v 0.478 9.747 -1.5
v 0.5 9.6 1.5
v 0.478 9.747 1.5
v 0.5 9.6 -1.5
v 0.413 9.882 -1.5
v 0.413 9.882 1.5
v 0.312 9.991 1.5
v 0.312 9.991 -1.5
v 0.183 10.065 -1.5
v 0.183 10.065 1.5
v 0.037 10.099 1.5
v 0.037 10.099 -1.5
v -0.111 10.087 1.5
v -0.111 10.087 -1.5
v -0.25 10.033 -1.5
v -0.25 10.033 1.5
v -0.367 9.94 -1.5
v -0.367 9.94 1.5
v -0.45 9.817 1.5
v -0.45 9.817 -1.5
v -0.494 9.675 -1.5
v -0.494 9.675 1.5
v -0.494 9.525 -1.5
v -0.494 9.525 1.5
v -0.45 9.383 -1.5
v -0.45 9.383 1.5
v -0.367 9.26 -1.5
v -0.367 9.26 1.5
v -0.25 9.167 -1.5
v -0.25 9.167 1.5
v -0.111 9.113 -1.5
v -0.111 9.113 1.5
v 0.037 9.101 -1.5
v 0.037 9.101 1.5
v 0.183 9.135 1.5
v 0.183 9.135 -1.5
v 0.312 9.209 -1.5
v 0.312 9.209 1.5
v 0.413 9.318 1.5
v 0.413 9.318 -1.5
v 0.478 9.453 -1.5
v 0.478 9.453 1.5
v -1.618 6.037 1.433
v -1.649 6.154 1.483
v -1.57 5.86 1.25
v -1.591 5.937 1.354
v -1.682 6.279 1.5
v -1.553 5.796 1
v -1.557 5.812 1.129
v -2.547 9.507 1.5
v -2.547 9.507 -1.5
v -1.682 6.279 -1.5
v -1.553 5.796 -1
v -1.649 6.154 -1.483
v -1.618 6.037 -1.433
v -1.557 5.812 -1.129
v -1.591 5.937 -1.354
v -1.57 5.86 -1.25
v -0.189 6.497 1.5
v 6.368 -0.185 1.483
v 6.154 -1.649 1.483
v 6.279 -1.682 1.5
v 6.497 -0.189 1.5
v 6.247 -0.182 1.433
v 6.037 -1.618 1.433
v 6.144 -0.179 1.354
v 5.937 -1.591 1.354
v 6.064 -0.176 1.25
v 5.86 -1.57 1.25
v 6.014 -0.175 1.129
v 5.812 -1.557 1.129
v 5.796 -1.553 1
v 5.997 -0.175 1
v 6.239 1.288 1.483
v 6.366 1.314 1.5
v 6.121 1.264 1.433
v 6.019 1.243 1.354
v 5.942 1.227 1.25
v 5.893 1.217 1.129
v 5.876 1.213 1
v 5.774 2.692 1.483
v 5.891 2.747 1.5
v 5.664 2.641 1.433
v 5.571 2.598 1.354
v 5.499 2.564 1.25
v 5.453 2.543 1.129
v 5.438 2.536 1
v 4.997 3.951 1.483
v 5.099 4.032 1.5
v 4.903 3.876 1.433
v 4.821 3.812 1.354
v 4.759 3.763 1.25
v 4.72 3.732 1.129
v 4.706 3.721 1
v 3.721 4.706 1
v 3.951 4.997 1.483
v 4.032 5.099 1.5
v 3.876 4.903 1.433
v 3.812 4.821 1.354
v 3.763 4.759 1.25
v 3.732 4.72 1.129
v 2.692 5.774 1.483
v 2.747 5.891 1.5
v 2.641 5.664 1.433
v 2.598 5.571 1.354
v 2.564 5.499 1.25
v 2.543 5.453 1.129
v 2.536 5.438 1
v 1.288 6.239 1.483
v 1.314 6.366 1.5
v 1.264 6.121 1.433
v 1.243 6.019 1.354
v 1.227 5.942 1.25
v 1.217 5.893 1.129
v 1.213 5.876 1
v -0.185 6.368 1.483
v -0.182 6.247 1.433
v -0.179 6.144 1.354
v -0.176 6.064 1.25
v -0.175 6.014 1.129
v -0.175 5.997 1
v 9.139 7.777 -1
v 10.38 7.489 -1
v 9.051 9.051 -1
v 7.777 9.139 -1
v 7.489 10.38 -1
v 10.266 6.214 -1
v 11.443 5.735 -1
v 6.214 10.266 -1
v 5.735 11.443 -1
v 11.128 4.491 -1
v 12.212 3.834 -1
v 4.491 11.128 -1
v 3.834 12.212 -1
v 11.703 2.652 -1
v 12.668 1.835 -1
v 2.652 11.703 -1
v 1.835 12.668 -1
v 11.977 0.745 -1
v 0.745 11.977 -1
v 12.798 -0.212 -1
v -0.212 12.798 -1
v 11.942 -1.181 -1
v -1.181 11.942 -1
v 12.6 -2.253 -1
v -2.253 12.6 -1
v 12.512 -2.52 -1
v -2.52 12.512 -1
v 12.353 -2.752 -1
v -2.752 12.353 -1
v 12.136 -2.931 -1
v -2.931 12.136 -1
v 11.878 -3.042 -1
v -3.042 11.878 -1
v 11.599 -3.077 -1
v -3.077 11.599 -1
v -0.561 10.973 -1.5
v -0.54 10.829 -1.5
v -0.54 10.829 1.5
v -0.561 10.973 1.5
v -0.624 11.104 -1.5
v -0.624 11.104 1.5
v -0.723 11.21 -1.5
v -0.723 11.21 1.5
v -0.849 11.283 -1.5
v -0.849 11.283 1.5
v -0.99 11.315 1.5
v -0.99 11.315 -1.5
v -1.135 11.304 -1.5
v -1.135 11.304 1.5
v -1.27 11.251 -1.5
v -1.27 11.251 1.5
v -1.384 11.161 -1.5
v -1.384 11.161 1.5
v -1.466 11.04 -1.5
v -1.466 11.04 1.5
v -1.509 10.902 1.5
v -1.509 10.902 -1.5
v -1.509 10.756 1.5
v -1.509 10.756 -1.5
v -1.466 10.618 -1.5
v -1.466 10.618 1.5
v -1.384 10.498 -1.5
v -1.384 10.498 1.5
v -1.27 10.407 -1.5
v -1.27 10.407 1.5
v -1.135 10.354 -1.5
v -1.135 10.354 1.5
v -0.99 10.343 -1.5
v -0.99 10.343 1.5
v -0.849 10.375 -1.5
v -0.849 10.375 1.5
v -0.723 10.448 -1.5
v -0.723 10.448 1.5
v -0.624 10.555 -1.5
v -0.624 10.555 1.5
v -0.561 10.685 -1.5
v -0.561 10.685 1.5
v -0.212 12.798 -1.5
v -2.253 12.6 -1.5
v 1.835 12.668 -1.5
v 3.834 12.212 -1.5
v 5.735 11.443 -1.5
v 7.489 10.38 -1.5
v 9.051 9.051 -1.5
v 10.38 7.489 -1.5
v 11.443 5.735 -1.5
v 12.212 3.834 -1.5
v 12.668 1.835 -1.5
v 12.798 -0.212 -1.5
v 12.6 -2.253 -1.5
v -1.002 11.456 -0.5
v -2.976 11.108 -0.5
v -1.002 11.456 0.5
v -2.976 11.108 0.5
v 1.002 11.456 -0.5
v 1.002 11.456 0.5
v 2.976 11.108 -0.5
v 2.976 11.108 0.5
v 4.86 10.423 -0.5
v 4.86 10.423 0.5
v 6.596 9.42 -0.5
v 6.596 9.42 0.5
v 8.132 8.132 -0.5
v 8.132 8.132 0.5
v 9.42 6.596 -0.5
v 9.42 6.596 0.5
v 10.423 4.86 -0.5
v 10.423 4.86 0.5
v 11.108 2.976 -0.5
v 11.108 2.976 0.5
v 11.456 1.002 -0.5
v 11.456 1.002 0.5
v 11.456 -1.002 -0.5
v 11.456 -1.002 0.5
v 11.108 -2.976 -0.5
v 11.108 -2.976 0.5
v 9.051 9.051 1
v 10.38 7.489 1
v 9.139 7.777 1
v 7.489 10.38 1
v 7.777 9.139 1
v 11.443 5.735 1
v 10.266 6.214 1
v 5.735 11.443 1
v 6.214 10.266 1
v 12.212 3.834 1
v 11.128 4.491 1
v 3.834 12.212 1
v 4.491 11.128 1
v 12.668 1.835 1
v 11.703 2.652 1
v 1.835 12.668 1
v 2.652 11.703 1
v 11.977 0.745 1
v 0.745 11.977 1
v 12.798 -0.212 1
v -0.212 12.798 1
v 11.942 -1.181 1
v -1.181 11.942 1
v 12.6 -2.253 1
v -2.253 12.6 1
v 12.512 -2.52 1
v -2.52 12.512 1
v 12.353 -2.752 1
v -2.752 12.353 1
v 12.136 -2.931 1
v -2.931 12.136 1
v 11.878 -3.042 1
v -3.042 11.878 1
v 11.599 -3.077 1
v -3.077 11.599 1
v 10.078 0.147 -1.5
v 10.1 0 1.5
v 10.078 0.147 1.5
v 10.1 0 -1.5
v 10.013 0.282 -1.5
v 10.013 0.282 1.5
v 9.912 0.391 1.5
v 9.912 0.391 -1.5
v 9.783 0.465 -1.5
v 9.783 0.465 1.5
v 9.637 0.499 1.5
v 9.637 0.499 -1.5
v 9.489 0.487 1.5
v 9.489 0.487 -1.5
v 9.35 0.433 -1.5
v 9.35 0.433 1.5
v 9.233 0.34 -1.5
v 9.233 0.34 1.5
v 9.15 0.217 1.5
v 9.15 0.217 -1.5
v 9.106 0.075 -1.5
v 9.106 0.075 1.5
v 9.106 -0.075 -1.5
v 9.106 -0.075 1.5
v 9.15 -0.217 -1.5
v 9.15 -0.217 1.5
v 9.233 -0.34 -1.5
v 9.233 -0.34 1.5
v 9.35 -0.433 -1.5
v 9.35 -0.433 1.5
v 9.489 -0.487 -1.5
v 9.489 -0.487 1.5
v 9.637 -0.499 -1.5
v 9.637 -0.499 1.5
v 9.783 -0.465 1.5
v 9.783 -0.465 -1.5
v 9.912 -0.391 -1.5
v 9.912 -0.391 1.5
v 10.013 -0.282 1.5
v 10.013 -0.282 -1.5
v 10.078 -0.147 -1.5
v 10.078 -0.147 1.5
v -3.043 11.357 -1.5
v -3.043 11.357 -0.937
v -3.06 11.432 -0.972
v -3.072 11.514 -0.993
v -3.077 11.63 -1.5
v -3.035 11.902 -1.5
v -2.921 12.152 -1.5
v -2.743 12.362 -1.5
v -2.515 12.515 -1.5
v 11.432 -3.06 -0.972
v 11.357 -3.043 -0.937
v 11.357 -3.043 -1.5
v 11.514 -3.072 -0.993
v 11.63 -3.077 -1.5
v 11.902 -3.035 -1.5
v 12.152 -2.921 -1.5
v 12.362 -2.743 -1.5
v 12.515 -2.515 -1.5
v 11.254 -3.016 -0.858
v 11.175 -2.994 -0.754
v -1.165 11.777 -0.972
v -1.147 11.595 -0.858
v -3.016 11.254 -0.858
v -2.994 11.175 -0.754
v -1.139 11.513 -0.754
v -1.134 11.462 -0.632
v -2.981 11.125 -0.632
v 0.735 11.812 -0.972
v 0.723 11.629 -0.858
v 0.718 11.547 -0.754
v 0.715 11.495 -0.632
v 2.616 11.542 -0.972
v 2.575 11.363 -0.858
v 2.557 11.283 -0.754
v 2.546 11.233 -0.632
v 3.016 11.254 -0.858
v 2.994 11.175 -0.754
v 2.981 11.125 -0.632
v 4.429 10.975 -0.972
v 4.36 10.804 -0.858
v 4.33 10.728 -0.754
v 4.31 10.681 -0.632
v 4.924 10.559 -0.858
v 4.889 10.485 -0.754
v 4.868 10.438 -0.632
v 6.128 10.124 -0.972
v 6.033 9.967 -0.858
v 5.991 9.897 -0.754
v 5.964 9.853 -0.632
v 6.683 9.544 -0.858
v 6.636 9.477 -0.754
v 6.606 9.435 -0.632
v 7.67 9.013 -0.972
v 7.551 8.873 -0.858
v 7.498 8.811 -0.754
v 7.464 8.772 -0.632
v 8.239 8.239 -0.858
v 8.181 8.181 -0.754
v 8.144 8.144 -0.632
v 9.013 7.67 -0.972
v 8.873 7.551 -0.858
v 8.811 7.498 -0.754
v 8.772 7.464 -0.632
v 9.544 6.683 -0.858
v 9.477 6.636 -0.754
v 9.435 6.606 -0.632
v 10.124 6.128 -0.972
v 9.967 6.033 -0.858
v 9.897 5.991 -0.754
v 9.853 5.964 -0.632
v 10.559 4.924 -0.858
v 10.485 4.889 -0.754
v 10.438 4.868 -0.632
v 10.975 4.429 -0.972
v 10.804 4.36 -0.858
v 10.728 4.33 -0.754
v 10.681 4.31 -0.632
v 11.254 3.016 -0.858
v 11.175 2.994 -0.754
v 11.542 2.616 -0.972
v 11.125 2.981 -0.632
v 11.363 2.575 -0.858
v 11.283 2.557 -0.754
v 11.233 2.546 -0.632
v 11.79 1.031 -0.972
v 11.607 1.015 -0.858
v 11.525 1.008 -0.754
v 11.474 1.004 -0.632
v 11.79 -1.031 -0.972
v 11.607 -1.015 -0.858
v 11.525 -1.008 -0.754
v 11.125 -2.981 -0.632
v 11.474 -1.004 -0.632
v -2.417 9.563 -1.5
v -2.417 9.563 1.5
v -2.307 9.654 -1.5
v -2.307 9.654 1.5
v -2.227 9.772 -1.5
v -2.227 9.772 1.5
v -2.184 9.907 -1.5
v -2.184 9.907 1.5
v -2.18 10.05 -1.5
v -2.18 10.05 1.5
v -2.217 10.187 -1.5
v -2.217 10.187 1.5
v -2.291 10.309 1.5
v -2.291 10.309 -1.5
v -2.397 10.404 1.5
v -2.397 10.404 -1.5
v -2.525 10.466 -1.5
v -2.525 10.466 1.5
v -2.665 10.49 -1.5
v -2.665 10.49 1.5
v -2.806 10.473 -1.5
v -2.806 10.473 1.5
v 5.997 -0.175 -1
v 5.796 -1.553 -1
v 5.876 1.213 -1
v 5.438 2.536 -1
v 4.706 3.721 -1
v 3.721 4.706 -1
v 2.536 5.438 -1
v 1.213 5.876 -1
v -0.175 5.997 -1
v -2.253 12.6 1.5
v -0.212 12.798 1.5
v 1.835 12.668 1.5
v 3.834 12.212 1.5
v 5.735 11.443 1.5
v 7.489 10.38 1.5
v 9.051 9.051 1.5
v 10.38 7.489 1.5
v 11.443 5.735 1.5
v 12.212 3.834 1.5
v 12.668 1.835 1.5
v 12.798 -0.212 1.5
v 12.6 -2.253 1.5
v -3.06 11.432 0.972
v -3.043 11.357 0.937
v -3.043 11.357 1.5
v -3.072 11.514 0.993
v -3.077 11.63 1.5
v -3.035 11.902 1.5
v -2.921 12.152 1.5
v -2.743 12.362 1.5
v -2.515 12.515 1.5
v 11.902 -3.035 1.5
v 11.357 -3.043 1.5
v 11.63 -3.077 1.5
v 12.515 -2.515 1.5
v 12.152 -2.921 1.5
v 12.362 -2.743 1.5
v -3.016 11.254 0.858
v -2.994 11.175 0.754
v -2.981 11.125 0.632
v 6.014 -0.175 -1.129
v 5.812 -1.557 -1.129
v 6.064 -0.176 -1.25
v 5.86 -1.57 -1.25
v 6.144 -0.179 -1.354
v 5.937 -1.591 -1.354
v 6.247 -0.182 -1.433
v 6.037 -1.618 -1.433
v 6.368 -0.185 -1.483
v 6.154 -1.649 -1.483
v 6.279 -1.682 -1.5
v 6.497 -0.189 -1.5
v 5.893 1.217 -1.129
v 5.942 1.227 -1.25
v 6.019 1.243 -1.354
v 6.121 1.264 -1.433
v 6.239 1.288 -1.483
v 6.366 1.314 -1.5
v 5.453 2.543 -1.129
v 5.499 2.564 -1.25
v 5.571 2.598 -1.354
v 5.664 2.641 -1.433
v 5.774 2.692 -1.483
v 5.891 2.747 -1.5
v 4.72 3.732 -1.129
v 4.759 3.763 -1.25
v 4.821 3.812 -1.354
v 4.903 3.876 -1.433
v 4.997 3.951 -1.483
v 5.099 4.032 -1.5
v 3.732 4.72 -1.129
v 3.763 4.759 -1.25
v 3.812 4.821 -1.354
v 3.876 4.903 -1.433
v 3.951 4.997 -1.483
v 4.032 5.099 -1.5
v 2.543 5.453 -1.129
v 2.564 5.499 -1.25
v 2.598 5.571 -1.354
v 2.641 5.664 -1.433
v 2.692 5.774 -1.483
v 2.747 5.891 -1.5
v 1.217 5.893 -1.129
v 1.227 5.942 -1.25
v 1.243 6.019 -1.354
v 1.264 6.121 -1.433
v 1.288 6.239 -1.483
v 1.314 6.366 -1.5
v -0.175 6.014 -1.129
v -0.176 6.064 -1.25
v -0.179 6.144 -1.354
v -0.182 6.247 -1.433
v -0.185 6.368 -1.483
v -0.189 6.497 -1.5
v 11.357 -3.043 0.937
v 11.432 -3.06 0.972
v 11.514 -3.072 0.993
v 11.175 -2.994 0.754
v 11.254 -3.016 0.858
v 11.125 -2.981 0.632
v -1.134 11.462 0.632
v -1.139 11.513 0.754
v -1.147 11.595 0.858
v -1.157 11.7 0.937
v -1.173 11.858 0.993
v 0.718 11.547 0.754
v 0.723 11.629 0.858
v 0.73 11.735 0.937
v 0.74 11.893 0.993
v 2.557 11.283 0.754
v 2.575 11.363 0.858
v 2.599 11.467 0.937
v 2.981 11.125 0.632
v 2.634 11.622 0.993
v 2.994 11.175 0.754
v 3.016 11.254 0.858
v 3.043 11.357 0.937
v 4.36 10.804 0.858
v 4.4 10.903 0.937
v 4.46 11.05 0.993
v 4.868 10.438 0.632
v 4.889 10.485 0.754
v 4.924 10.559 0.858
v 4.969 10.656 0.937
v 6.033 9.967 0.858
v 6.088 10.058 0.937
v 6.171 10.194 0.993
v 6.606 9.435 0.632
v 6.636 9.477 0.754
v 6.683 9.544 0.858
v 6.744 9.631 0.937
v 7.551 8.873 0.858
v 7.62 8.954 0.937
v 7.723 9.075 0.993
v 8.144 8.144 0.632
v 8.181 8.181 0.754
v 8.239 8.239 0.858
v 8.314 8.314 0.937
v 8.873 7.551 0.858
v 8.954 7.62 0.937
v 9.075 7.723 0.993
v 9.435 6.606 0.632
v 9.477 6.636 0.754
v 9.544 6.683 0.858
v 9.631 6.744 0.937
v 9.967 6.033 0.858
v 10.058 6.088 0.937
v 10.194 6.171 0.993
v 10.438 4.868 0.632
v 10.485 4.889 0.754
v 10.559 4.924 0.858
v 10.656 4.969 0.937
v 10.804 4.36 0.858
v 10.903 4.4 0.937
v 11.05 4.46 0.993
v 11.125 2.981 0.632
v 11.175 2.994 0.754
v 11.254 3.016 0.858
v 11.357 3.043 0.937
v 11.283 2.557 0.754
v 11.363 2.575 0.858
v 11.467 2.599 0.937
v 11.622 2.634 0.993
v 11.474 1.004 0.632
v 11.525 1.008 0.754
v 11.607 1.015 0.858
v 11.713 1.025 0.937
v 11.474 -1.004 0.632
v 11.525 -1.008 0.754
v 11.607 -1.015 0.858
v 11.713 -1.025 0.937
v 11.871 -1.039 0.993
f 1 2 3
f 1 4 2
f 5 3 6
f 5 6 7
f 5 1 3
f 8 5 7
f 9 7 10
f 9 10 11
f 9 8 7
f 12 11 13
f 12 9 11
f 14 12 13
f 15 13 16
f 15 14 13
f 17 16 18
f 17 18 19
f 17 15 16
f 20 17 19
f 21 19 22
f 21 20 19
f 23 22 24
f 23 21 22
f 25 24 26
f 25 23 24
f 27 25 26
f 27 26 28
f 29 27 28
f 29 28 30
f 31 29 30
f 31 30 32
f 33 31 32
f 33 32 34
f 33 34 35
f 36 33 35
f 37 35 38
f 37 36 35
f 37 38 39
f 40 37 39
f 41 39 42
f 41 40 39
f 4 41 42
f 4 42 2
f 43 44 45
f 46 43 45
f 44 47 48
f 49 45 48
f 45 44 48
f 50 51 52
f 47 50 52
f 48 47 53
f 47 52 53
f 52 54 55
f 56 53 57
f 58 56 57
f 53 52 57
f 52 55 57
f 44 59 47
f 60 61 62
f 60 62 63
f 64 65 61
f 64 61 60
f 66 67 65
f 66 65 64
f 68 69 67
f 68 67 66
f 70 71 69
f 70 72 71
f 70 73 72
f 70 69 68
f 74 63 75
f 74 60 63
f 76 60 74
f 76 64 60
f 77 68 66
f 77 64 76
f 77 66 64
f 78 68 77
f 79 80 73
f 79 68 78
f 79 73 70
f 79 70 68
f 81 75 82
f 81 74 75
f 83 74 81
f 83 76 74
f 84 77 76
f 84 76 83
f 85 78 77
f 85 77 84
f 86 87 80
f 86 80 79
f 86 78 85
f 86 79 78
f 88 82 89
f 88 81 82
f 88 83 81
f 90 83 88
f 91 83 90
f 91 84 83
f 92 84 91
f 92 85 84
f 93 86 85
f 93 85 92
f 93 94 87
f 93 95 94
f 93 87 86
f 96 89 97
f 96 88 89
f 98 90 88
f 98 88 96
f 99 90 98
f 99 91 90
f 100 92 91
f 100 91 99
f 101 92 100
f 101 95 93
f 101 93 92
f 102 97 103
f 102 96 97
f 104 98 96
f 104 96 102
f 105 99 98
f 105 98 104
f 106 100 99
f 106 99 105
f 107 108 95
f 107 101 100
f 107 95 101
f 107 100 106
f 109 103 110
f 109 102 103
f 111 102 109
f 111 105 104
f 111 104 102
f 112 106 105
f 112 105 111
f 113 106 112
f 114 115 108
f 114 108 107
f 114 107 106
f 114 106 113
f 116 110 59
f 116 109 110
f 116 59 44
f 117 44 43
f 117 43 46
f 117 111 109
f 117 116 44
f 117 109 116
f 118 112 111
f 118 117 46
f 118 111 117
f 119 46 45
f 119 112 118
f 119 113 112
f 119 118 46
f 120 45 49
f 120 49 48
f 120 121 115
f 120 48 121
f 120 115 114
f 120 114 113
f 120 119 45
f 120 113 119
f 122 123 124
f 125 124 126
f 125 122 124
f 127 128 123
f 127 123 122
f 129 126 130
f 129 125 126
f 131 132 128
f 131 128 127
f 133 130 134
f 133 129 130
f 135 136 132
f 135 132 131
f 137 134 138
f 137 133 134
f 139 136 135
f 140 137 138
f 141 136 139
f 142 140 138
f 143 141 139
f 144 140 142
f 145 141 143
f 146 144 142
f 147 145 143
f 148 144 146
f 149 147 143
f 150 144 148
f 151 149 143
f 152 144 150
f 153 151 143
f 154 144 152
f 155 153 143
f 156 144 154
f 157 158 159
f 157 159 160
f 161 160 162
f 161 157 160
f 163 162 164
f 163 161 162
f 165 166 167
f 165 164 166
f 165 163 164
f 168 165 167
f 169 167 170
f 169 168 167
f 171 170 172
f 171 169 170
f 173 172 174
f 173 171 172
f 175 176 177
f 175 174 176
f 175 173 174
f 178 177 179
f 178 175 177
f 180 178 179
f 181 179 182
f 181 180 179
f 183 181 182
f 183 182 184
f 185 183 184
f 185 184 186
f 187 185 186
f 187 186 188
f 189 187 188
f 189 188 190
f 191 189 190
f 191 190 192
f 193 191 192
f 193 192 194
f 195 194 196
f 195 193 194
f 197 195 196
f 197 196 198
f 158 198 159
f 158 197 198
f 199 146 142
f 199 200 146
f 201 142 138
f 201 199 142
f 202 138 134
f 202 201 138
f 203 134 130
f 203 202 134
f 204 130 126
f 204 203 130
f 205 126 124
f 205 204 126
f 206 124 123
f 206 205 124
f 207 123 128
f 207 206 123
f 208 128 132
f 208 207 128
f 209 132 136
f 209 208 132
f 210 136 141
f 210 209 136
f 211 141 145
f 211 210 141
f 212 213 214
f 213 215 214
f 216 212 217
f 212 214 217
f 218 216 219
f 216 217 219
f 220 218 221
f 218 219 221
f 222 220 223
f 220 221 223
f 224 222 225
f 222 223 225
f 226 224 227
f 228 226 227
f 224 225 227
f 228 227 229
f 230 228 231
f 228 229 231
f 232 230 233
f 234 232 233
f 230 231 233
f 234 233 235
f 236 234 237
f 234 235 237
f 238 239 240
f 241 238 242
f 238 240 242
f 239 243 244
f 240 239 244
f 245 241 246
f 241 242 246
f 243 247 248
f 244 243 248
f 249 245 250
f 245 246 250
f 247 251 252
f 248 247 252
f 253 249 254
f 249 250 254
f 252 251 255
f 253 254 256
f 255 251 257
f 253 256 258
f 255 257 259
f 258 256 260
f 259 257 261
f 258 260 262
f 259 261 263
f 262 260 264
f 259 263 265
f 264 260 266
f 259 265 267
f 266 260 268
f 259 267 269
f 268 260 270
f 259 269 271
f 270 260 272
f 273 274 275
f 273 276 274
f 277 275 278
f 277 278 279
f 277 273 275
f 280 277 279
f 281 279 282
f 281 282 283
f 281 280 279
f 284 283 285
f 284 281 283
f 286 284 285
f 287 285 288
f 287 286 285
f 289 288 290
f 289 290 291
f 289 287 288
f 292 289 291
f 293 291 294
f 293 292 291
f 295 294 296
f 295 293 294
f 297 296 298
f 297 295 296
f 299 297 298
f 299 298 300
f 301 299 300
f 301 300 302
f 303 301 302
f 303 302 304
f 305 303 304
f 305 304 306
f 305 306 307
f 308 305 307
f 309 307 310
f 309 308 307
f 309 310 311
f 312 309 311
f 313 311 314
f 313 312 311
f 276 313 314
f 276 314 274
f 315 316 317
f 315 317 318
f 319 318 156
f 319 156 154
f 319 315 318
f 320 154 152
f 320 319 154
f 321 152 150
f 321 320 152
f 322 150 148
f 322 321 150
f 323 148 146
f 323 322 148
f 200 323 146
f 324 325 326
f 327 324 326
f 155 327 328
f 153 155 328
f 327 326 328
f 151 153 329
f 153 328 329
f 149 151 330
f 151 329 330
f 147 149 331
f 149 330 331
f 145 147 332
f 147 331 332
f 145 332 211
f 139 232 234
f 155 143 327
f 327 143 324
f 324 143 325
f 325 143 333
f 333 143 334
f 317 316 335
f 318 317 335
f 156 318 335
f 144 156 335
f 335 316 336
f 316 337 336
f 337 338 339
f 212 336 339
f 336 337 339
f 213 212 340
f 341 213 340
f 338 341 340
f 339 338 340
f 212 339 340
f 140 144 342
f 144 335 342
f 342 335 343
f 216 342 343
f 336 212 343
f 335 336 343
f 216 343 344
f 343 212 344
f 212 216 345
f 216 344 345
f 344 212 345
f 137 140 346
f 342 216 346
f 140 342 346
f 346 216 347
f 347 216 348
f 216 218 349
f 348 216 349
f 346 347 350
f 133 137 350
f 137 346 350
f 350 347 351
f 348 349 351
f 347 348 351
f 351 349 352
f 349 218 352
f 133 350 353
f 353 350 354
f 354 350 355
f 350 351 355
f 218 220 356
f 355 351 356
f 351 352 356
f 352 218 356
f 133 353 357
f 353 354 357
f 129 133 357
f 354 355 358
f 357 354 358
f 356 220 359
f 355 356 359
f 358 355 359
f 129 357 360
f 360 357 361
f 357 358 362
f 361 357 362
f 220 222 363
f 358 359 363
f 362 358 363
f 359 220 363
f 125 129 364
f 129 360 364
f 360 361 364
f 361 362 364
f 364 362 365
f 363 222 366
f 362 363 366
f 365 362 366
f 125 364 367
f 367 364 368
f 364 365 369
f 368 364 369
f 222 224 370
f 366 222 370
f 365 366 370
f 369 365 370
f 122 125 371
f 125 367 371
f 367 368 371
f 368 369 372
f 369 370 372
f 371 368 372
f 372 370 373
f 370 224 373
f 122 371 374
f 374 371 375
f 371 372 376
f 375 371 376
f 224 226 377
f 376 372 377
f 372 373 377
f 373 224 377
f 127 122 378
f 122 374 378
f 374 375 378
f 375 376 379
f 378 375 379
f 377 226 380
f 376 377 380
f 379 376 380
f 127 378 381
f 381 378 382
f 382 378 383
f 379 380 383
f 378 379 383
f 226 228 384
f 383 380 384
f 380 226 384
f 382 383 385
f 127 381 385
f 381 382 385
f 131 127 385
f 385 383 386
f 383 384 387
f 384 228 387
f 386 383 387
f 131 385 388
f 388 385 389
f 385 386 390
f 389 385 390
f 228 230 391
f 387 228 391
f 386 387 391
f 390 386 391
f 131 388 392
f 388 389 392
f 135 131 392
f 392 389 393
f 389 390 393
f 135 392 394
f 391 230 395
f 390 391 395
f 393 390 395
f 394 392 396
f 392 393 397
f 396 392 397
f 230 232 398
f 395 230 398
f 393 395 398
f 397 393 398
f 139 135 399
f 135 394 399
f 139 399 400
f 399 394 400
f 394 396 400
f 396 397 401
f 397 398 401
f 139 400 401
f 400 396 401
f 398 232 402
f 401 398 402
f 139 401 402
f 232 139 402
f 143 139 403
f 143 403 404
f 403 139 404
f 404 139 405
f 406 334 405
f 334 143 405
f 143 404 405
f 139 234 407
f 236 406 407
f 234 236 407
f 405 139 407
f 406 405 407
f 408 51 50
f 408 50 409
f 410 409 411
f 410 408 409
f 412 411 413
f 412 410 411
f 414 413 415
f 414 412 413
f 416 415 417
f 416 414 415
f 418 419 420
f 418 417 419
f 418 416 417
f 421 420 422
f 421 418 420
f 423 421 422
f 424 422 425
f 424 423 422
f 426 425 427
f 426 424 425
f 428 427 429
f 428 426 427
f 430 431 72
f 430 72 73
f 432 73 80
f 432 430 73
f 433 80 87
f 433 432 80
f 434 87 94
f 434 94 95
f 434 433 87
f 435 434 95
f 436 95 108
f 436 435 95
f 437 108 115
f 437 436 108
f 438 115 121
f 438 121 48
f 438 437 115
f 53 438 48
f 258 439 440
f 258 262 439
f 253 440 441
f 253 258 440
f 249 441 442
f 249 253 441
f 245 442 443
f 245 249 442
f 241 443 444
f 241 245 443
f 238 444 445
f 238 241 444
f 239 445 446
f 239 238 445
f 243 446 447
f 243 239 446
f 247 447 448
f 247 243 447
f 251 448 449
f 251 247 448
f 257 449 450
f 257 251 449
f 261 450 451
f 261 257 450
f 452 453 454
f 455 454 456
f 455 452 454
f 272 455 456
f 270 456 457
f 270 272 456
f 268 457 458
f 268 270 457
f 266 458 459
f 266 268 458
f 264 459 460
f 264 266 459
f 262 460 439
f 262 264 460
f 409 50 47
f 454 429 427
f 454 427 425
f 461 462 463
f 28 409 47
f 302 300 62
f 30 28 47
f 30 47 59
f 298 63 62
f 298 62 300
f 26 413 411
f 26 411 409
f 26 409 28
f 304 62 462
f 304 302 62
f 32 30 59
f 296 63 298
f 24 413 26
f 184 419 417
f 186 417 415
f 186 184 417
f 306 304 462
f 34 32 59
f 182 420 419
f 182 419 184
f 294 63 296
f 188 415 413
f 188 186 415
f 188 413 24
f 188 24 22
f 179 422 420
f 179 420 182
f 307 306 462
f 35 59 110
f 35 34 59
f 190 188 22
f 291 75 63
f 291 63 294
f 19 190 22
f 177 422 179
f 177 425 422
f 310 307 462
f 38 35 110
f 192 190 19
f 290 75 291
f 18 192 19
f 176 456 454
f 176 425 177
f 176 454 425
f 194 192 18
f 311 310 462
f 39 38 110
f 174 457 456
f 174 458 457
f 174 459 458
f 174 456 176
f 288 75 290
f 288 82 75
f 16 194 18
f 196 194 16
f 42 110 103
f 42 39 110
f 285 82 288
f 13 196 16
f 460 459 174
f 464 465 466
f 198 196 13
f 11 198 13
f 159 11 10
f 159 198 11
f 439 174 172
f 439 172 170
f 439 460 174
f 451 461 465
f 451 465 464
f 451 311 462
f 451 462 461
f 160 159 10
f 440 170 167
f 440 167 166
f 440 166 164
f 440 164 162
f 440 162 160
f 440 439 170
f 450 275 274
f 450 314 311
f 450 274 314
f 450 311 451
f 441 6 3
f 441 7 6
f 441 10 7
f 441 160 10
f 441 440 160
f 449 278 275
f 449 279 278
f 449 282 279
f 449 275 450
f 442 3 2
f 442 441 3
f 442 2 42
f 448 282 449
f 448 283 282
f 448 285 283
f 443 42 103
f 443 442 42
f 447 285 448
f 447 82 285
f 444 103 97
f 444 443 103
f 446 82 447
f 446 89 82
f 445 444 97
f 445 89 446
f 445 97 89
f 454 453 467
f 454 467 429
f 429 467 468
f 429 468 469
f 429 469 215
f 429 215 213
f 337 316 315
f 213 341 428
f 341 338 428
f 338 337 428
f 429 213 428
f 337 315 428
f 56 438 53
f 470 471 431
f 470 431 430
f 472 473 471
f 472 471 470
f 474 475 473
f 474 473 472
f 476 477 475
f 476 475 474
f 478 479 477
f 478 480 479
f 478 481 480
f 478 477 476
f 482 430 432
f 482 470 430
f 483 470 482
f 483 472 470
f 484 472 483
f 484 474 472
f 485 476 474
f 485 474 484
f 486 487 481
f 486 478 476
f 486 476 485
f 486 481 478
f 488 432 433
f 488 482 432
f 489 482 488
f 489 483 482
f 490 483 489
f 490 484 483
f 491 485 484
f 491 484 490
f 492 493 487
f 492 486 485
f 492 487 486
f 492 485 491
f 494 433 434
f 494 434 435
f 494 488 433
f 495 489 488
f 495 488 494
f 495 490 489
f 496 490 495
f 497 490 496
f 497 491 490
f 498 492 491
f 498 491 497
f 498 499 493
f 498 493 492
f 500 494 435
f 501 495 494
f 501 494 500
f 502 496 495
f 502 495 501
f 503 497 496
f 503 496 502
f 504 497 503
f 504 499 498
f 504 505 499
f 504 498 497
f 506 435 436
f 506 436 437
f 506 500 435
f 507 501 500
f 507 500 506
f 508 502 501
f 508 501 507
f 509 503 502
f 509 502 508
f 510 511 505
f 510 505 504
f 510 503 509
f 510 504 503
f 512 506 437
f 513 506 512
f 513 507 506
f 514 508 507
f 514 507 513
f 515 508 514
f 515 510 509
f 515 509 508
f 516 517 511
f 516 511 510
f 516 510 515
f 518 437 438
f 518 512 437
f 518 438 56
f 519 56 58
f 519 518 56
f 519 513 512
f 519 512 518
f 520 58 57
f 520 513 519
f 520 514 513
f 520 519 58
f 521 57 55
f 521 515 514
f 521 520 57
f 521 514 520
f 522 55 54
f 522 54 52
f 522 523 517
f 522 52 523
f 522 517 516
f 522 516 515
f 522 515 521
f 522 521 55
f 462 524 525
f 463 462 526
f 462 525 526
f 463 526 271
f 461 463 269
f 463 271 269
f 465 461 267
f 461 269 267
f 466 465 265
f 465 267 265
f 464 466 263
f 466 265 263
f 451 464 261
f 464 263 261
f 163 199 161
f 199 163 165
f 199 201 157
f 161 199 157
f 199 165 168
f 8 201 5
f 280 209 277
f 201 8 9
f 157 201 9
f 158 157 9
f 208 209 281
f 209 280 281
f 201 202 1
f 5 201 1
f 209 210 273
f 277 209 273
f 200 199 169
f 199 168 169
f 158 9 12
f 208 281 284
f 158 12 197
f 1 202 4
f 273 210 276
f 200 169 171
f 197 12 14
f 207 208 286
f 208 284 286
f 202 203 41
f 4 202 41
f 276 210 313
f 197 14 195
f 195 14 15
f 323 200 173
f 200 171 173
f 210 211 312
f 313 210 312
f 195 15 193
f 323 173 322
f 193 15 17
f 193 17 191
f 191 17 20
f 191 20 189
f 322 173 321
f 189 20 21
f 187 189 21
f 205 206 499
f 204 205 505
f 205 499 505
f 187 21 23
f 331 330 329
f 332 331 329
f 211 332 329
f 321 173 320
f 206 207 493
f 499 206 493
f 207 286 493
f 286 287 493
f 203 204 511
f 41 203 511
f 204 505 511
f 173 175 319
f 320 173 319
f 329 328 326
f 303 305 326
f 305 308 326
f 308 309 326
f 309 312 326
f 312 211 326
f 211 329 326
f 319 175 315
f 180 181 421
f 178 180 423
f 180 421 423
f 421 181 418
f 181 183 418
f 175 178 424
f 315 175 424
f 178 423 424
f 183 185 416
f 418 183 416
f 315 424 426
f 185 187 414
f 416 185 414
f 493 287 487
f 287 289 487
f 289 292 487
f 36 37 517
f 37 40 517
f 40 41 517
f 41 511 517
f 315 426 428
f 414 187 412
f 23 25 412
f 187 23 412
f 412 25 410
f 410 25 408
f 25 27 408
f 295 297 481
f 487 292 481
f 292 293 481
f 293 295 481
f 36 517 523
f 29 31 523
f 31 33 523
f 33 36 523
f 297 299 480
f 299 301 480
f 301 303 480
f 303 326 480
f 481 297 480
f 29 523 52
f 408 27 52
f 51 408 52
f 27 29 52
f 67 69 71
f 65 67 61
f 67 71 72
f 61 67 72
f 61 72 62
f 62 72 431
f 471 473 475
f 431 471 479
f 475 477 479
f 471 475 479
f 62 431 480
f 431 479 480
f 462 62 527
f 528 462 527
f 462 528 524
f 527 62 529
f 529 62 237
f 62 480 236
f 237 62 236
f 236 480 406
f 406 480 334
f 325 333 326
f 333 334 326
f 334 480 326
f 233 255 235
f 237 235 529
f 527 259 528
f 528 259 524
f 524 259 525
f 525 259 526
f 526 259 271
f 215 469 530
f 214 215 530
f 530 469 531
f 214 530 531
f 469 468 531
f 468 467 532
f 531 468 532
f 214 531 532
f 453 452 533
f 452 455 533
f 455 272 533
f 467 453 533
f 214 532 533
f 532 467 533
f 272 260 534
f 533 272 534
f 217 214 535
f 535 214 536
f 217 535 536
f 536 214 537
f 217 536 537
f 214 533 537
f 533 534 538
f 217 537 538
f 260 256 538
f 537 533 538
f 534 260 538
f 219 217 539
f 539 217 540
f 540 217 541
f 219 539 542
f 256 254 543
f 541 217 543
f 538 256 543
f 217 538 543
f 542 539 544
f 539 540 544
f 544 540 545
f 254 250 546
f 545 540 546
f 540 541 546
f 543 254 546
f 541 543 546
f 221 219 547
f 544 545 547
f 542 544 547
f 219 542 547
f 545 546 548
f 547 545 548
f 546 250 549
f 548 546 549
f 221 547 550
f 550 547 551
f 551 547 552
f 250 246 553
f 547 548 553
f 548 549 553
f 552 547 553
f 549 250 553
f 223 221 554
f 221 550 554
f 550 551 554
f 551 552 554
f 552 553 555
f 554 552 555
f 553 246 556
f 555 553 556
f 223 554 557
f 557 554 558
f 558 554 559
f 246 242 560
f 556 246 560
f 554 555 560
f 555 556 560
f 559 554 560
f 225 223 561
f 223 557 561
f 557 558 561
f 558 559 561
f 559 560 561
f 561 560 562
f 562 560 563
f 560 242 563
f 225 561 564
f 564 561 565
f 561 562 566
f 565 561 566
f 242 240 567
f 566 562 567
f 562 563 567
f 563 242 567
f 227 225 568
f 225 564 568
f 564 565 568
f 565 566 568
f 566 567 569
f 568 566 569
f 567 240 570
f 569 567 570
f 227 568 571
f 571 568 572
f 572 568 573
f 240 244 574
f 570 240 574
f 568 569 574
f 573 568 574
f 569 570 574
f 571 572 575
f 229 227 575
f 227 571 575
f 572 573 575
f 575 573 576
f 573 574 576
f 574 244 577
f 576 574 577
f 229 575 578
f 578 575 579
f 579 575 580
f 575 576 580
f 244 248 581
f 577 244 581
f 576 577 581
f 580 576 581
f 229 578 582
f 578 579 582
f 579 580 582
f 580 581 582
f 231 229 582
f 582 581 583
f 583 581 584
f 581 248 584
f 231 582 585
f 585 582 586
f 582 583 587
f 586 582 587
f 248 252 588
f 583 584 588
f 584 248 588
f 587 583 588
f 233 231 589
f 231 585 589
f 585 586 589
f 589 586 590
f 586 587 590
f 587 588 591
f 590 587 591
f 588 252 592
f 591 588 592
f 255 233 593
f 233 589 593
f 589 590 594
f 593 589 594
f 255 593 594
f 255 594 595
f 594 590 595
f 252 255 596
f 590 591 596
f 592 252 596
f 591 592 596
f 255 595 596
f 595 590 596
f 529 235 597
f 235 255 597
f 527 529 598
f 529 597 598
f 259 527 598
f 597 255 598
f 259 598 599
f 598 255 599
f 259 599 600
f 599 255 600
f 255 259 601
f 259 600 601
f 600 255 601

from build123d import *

# Parameters (mm, degrees)
SKETCH1_R               = 12
SKETCH1_R_2             = 0.5
SKETCH1_R_3             = 6
BOSS_EXTRUDE1_DEPTH     = 1.5
SKETCH6_W               = 0.8
SKETCH6_H               = 0.5
CUT_EXTRUDE1_DEPTH      = 19.163975336
CUT_EXTRUDE1_DEPTH_BACK = 19.163975336
CUT_EXTRUDE2_DEPTH      = 19.348841925
CUT_EXTRUDE2_DEPTH_BACK = 19.348841925
SKETCH5_R               = 0.5
SKETCH5_R_2             = 0.48729794
FILLET1_R               = 0.5
FILLET2_R               = 1


with BuildPart() as part:
    # Sketch1 → Boss-Extrude1 (new, symmetric)
    with BuildSketch(Plane.XY):
        Circle(SKETCH1_R)
        with Locations((9.6, 0)):
            Circle(SKETCH1_R_2, mode=Mode.SUBTRACT)
        Circle(SKETCH1_R_3, mode=Mode.SUBTRACT)
        with Locations((0, -9.6)):
            Circle(SKETCH1_R_2, mode=Mode.SUBTRACT)
        with Locations((-9.6, 0)):
            Circle(SKETCH1_R_2, mode=Mode.SUBTRACT)
        with Locations((0, 9.6)):
            Circle(SKETCH1_R_2, mode=Mode.SUBTRACT)
    extrude(amount=BOSS_EXTRUDE1_DEPTH, both=True)

    # Sketch2 → Cut-Revolve1 (revolve, cut)
    with BuildSketch(Plane(origin=(0, 0, 0), x_dir=(1, 0, 0), z_dir=(0, 1, 0)), mode=Mode.PRIVATE) as cut_revolve1_sk:
        with BuildLine():
            Line((-11.5, 0.5), (-11.5, -0.5))
            ThreePointArc((-11.5, -0.5), (-11.646446609, -0.853553391), (-12, -1))
            Line((-12, -1), (-12, 1))
            ThreePointArc((-12, 1), (-11.646446609, 0.853553391), (-11.5, 0.5))
        make_face()
    revolve(cut_revolve1_sk.sketch.rotate(Axis((0, 0, 0), (0, 0, -1)), 180), axis=Axis((0, 0, 0), (0, 0, -1)), mode=Mode.SUBTRACT)

    # Sketch6 → Revolve1 (revolve)
    with BuildSketch(Plane(origin=(0, 0, 0), x_dir=(1, 0, 0), z_dir=(0, 1, 0))):
        with Locations((12.4, 1.25)):
            Rectangle(SKETCH6_W, SKETCH6_H)
        with Locations((12.4, -1.25)):
            Rectangle(SKETCH6_W, SKETCH6_H)
    revolve(axis=Axis((0, 0, 0), (0, 0, -1)))

    # Sketch4 → Cut-Extrude1 (cut, two sides: drawn at the far end of the back side and taken through both)
    with BuildSketch(Plane.XY.offset(-CUT_EXTRUDE1_DEPTH_BACK)):
        Polygon((-3.743635752, 13.97143883), (0, 0), (14.900233226, -3.99250546), (14.900233226, -14.839385646), (-15.188066433, -14.839385646), (-15.188066433, 13.97143883), align=None)
    extrude(amount=CUT_EXTRUDE1_DEPTH + CUT_EXTRUDE1_DEPTH_BACK, mode=Mode.SUBTRACT)

    # Sketch5 → Cut-Extrude2 (cut, two sides: drawn at the far end of the back side and taken through both)
    with BuildSketch(Plane.XY.offset(1.5).offset(-CUT_EXTRUDE2_DEPTH_BACK)):
        with Locations((-2.67687174, 9.990221337)):
            Circle(SKETCH5_R)
        with Locations((-1.026834566, 10.829057404)):
            Circle(SKETCH5_R_2)
    extrude(amount=CUT_EXTRUDE2_DEPTH + CUT_EXTRUDE2_DEPTH_BACK, mode=Mode.SUBTRACT)

    # Fillet1
    fillet1_edges = [part.edges().sort_by_distance(p)[0] for p in [
        (4.242640687, 4.242640687, 1.5),
        (4.242640687, 4.242640687, -1.5),
    ]]
    fillet(fillet1_edges, radius=FILLET1_R)

    # Fillet2
    fillet2_edges = [part.edges().sort_by_distance(p)[0] for p in [
        (12.363850577, -3.312883777, -1.25),
        (12.363850577, -3.312883777, 1.25),
        (-3.312883777, 12.363850577, -1.25),
        (-3.312883777, 12.363850577, 1.25),
    ]]
    fillet(fillet2_edges, radius=FILLET2_R)


solid = part.part
